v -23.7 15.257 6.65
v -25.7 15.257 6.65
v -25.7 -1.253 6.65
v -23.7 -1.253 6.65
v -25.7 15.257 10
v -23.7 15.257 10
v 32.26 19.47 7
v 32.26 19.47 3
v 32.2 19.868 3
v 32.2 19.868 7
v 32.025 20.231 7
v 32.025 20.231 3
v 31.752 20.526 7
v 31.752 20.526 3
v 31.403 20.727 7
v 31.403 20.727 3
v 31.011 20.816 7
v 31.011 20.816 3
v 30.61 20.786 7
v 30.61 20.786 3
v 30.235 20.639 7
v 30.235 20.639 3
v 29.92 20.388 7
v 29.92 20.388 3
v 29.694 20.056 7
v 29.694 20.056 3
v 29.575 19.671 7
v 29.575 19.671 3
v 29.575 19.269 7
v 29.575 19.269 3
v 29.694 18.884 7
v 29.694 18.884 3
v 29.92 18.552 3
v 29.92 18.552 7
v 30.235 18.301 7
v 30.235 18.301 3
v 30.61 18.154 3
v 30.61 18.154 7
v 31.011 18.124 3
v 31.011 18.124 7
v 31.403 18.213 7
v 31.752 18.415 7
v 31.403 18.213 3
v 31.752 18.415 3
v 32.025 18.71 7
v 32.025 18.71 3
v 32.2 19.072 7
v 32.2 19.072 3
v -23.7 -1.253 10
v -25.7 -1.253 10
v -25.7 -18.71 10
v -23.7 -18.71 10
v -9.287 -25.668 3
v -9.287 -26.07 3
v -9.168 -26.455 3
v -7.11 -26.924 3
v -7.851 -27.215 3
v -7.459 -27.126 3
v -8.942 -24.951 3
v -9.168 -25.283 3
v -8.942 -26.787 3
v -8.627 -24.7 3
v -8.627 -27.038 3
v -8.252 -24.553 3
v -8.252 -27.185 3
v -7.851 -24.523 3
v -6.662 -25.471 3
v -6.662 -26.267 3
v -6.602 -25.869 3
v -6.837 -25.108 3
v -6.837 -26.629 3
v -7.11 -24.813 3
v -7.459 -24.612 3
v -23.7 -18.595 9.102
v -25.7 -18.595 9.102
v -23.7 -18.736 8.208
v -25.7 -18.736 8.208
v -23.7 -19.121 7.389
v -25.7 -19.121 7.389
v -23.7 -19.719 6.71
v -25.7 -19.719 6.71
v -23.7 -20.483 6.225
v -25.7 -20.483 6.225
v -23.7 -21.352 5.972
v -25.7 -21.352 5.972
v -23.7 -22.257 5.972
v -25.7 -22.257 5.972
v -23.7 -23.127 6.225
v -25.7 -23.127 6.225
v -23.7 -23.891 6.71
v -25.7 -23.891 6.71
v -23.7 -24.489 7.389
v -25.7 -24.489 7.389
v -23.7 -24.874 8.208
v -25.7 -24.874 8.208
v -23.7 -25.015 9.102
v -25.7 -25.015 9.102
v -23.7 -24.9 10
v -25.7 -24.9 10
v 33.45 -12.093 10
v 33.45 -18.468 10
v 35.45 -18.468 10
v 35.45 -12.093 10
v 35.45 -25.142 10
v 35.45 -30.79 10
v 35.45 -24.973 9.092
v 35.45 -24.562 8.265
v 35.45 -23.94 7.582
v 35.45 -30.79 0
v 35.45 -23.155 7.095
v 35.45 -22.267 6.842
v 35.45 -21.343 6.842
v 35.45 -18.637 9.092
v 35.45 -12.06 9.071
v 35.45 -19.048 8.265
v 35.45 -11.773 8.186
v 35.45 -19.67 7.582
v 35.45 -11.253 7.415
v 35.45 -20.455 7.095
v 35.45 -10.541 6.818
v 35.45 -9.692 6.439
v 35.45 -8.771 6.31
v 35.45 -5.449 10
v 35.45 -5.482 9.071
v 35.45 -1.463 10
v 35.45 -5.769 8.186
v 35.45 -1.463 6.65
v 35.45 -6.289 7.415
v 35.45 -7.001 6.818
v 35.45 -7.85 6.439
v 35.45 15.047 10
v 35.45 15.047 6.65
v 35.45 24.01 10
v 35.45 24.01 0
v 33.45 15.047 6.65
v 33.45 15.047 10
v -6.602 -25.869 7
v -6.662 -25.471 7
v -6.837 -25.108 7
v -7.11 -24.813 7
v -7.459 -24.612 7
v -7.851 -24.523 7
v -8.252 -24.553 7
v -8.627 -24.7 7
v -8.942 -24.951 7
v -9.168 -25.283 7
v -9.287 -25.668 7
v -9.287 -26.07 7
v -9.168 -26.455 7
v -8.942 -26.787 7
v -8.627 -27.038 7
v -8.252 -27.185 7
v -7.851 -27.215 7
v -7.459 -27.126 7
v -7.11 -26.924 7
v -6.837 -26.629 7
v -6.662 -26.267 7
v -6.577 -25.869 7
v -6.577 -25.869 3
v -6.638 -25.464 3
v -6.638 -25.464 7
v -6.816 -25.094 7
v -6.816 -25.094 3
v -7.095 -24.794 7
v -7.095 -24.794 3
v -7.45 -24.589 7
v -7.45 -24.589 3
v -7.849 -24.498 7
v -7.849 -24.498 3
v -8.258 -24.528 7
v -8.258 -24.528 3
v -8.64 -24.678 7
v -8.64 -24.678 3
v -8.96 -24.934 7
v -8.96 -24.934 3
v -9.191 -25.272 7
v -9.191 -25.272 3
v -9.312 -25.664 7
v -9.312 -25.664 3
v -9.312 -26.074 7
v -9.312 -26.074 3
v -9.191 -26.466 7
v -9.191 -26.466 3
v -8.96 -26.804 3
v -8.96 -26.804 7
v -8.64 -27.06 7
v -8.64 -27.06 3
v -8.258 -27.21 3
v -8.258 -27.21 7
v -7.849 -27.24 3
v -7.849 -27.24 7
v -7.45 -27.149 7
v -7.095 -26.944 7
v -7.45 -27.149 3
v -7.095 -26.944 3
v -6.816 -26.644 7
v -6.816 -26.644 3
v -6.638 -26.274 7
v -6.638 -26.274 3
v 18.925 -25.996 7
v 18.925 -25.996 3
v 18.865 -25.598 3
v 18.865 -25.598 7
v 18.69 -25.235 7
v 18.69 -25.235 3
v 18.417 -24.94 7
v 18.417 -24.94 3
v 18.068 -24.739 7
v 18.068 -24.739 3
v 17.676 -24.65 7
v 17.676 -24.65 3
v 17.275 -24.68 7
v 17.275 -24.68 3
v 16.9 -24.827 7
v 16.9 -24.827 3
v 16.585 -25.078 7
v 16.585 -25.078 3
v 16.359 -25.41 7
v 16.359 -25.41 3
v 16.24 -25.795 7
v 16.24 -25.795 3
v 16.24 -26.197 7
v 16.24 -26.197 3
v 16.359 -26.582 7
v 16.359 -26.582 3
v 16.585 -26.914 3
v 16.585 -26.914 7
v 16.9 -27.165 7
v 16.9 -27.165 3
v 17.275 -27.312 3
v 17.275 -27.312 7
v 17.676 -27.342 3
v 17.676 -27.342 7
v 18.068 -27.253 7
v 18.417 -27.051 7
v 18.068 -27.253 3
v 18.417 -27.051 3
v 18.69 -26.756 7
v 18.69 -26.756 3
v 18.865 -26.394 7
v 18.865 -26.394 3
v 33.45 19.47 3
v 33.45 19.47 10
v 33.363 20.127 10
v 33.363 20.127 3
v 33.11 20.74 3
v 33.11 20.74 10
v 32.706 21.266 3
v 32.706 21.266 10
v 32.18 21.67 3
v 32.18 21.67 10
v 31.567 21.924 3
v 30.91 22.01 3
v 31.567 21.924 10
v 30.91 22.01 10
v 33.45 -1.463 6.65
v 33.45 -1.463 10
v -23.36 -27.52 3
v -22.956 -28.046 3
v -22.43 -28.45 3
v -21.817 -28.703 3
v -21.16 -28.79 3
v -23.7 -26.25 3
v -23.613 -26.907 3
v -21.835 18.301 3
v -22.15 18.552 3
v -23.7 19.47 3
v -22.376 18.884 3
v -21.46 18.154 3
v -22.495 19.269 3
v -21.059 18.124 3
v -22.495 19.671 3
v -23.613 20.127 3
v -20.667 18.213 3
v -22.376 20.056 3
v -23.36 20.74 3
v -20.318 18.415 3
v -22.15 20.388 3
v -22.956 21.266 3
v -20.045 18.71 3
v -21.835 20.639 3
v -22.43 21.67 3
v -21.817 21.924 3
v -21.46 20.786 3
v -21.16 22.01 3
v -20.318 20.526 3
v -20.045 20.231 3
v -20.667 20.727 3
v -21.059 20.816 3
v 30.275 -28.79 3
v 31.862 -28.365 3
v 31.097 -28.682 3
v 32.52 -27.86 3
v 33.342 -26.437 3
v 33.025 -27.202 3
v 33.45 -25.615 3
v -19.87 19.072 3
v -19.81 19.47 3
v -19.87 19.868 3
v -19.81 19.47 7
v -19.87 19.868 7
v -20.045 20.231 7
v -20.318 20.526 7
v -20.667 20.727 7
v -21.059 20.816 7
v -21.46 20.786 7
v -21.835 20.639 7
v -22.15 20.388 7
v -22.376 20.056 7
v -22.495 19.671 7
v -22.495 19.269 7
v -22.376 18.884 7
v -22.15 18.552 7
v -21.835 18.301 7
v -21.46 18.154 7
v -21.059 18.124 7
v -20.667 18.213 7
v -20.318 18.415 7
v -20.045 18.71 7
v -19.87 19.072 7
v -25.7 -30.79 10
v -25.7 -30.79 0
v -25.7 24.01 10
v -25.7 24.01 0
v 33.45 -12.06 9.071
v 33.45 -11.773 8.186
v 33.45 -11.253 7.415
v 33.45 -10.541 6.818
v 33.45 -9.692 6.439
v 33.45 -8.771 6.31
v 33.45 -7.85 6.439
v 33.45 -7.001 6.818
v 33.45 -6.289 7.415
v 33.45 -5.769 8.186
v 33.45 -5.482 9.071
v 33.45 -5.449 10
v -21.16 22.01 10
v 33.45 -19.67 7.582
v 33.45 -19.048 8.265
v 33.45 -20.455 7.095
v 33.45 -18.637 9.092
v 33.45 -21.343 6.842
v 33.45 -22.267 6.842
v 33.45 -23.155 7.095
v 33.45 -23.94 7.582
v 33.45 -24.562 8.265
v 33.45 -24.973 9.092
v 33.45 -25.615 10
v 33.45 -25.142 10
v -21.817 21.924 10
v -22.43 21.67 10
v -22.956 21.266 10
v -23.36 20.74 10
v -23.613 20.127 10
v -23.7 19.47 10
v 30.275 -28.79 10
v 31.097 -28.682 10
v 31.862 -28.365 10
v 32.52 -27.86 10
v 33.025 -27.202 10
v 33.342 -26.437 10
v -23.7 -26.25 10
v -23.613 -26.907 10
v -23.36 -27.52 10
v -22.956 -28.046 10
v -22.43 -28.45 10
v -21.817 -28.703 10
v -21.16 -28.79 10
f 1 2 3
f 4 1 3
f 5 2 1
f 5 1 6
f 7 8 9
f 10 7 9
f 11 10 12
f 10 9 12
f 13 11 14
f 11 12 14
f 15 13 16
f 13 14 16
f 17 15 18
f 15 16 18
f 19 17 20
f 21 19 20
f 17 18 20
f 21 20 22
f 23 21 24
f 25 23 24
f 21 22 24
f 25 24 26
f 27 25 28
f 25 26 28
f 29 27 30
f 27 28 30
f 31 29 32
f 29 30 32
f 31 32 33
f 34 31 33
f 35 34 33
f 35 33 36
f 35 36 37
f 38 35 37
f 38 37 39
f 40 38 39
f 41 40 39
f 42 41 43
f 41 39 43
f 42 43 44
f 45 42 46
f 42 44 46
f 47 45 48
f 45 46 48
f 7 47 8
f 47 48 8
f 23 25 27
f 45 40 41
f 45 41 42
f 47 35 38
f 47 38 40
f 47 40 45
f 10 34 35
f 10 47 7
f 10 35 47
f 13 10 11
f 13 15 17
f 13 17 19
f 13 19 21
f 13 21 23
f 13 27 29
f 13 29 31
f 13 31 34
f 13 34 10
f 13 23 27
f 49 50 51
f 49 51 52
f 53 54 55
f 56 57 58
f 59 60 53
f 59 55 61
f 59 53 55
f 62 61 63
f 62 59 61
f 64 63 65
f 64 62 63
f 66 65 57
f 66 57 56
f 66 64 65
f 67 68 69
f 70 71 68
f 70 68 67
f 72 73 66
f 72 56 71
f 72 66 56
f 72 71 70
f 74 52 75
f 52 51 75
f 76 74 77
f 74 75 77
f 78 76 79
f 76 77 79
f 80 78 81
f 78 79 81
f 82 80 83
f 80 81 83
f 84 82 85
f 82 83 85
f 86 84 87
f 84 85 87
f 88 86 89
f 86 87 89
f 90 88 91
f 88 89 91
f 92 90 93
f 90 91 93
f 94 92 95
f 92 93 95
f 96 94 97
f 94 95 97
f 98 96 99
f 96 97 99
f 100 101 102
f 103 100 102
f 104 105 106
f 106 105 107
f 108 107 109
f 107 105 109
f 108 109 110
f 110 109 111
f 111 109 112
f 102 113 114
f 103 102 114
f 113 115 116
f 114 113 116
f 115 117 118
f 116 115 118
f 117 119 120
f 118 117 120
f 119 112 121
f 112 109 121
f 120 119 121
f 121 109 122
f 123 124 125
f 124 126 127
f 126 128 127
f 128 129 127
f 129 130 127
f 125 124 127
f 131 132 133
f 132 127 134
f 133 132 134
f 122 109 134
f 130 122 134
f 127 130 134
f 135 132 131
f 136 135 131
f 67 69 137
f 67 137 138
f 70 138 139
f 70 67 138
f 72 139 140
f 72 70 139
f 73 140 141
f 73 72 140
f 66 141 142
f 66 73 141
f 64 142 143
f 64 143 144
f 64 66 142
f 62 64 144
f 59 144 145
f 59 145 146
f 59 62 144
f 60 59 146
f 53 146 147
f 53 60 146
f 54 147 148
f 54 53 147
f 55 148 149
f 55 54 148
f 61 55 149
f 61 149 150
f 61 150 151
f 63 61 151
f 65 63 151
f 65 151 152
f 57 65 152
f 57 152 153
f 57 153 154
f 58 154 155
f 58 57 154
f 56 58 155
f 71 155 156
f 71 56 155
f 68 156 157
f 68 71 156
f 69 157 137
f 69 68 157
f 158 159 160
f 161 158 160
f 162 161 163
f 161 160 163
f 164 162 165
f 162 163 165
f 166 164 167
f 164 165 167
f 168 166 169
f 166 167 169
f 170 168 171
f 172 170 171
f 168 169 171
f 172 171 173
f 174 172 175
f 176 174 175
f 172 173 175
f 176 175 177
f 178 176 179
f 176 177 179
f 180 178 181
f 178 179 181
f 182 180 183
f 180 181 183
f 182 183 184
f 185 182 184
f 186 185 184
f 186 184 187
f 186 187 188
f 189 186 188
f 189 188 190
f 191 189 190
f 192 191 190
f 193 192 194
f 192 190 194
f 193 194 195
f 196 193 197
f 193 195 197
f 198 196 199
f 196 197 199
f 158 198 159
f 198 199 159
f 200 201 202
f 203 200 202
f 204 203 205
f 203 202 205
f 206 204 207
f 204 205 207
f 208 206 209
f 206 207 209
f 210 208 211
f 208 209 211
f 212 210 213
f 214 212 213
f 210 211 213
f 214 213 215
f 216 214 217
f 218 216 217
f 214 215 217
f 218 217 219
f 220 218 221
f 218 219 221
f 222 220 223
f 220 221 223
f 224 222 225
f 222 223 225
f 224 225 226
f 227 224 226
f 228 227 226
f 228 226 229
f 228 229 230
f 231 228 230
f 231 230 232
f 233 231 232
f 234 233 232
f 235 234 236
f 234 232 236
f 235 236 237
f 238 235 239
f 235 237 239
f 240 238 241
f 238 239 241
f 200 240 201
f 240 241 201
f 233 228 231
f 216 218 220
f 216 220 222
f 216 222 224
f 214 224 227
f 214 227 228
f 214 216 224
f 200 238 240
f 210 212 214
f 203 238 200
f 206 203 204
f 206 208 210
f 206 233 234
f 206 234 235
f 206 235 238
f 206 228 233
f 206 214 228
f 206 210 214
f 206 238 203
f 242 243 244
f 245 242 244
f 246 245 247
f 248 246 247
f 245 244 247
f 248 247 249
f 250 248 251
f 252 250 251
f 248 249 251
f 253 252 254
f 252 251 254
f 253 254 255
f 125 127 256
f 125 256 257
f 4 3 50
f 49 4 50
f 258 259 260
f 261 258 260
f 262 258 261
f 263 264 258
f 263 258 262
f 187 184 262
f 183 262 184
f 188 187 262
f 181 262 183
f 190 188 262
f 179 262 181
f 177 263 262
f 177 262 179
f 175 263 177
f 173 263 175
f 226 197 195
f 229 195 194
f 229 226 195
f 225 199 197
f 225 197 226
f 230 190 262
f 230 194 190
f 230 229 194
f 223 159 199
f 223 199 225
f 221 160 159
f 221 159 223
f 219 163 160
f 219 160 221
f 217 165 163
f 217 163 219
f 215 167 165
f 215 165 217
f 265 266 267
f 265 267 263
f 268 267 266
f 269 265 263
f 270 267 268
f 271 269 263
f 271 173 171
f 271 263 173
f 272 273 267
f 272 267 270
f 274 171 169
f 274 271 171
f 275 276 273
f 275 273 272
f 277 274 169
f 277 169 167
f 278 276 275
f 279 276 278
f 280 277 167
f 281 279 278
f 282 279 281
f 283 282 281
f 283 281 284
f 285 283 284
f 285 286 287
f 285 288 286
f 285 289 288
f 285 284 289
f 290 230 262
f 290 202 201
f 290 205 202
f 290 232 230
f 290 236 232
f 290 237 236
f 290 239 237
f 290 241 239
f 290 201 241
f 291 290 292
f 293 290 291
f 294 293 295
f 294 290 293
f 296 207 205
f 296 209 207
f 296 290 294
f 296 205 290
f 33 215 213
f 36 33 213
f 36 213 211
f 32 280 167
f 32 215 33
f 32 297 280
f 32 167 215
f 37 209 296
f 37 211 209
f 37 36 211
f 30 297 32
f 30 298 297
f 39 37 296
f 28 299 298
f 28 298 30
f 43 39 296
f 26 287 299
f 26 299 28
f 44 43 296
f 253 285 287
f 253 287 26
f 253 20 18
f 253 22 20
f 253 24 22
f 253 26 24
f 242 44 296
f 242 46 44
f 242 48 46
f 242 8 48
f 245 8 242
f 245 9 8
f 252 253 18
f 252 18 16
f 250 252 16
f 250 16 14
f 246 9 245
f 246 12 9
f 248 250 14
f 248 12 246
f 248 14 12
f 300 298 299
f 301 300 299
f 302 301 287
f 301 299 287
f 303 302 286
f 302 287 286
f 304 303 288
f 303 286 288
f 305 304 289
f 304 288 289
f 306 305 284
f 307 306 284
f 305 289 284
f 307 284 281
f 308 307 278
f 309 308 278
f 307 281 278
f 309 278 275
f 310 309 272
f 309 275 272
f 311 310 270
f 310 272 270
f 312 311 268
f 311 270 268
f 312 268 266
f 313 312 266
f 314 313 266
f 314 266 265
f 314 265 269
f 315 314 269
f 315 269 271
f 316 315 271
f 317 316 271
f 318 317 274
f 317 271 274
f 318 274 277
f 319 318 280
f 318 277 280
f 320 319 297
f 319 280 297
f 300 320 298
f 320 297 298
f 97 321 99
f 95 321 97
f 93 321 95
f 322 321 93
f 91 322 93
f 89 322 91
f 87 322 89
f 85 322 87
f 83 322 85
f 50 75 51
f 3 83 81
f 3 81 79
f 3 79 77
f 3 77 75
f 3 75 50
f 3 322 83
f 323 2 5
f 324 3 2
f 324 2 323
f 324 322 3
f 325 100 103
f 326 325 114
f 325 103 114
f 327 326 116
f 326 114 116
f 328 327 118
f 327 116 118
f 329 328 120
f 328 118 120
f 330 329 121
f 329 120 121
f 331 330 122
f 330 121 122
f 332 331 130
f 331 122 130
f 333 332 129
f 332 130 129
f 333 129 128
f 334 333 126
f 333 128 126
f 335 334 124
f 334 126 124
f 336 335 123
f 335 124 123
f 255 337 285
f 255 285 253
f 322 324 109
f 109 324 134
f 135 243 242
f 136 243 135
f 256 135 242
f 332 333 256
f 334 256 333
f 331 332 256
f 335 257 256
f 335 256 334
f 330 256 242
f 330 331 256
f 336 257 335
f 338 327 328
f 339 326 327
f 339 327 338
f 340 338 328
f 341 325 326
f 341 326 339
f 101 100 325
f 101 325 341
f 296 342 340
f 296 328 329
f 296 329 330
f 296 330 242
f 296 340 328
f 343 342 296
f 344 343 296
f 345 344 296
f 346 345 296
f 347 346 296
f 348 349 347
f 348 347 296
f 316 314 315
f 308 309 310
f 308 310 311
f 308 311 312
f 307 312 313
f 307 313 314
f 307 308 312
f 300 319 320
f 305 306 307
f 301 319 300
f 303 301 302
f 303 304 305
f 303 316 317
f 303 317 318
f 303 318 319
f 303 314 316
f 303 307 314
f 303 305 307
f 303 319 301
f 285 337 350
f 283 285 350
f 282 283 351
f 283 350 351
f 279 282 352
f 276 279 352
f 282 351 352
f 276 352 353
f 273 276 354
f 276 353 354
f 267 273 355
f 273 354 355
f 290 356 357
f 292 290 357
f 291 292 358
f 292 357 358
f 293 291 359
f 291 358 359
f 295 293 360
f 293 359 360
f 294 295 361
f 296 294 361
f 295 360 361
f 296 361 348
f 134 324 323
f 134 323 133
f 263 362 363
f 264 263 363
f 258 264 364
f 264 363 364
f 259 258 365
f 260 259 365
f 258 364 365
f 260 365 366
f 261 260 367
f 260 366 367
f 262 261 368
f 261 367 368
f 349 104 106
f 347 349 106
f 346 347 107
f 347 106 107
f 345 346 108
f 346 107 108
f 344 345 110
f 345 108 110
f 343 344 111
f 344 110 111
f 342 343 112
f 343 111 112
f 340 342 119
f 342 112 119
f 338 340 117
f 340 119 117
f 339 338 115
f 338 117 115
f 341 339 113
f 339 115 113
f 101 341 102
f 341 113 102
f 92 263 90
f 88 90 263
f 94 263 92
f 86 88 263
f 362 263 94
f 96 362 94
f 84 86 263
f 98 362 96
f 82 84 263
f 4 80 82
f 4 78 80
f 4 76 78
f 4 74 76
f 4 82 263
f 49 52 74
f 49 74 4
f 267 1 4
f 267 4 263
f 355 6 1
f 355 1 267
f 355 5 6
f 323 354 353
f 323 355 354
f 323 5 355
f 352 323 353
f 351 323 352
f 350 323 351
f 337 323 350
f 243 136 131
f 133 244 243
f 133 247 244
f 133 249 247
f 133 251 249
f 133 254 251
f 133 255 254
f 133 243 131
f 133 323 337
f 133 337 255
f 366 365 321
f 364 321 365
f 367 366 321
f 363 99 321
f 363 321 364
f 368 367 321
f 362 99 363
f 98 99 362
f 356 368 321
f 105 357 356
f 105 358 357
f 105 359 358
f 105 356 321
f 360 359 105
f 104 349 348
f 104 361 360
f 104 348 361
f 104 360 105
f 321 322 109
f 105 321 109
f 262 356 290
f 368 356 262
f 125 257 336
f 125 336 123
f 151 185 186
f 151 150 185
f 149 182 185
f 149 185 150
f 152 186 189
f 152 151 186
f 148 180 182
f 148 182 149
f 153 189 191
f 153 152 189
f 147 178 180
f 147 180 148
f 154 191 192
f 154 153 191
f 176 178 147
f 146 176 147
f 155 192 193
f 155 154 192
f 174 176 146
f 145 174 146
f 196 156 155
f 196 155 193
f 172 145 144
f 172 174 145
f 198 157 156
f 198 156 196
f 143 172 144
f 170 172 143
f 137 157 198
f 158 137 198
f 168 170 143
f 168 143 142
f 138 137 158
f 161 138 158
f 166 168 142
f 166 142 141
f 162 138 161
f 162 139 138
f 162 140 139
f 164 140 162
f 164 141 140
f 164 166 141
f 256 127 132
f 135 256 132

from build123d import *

# Parameters (mm, degrees)
SKETCH_W        = 61.15
SKETCH_H        = 54.8
PAD_DEPTH       = 10
POCKET_DEPTH    = 7
SKETCH002_R     = 3.21
SKETCH002_W     = 16.51
SKETCH002_H     = 3.3499967217
POCKET001_DEPTH = 5
SKETCH003_R     = 3.34
SKETCH003_W     = 16.51
SKETCH003_H     = 3.3499967217
POCKET002_DEPTH = 5
SKETCH009_R     = 1.375159
SKETCH009_R_2   = 1.35
PAD003_DEPTH    = 4


with BuildPart() as part:
    # Sketch → Pad (new body)
    with BuildSketch(Plane.XY):
        with Locations((4.8749828339, -3.3899418259)):
            Rectangle(SKETCH_W, SKETCH_H)
    extrude(amount=PAD_DEPTH)

    # Sketch001 (on Face6 of Pad) → Pocket (cut)
    with BuildSketch(Plane.XY.offset(10)):
        with BuildLine():
            ThreePointArc((33.4499828339, 19.4700581741), (32.706036987, 21.2661123273), (30.9099828339, 22.0100581741))
            Line((-21.1600171661, 22.0100581741), (30.9099828339, 22.0100581741))
            ThreePointArc((-21.1600171661, 22.0100581741), (-22.9560771773, 21.2661181853), (-23.7000171661, 19.4700581741))
            Line((-23.7000171661, -26.2499418259), (-23.7000171661, 19.4700581741))
            ThreePointArc((-23.7000171661, -26.2499418259), (-22.9560713193, -28.045995979), (-21.1600171661, -28.7899418259))
            Line((30.2749828339, -28.7899418259), (-21.1600171661, -28.7899418259))
            ThreePointArc((30.2749828339, -28.7899418259), (32.5200439352, -27.8600029272), (33.4499828339, -25.6149418259))
            Line((33.4499828339, 19.4700581741), (33.4499828339, -25.6149418259))
        make_face()
    extrude(amount=-POCKET_DEPTH, mode=Mode.SUBTRACT)

    # Sketch002 (on Face2 of Pocket) → Pocket001 (cut)
    with BuildSketch(Plane(origin=(-25.7000171661, 0, 0), x_dir=(0, -1, 0), z_dir=(-1, 0, 0))):
        with Locations((21.8049418259, 9.1500032783)):
            Circle(SKETCH002_R)
        with Locations((-7.0020581741, 8.3250016391)):
            Rectangle(SKETCH002_W, SKETCH002_H)
    extrude(amount=-POCKET001_DEPTH, mode=Mode.SUBTRACT)

    # Sketch003 (on Face3 of Pocket001) → Pocket002 (cut)
    with BuildSketch(Plane.YZ.offset(35.4499828339)):
        with Locations((-21.8049418259, 10.1500032783)):
            Circle(SKETCH003_R)
        with Locations((-8.7709418259, 9.6500032783)):
            Circle(SKETCH003_R)
        with Locations((6.7920581741, 8.3250016391)):
            Rectangle(SKETCH003_W, SKETCH003_H)
    extrude(amount=-POCKET002_DEPTH, mode=Mode.SUBTRACT)

    # Sketch009 (on Face30 of Pocket002) → Pad003 (join)
    with BuildSketch(Plane.XY.offset(3)):
        with Locations((-7.9520171661, -25.8689418259)):
            Circle(SKETCH009_R)
        with Locations((-7.9520171661, -25.8689418259)):
            Circle(SKETCH009_R_2, mode=Mode.SUBTRACT)
        with Locations((17.5749828339, -25.9959418259)):
            Circle(SKETCH009_R_2)
        with Locations((30.9099828339, 19.4700581741)):
            Circle(SKETCH009_R_2)
        with Locations((-21.1600171661, 19.4700581741)):
            Circle(SKETCH009_R_2)
    extrude(amount=PAD003_DEPTH)


solid = part.part
